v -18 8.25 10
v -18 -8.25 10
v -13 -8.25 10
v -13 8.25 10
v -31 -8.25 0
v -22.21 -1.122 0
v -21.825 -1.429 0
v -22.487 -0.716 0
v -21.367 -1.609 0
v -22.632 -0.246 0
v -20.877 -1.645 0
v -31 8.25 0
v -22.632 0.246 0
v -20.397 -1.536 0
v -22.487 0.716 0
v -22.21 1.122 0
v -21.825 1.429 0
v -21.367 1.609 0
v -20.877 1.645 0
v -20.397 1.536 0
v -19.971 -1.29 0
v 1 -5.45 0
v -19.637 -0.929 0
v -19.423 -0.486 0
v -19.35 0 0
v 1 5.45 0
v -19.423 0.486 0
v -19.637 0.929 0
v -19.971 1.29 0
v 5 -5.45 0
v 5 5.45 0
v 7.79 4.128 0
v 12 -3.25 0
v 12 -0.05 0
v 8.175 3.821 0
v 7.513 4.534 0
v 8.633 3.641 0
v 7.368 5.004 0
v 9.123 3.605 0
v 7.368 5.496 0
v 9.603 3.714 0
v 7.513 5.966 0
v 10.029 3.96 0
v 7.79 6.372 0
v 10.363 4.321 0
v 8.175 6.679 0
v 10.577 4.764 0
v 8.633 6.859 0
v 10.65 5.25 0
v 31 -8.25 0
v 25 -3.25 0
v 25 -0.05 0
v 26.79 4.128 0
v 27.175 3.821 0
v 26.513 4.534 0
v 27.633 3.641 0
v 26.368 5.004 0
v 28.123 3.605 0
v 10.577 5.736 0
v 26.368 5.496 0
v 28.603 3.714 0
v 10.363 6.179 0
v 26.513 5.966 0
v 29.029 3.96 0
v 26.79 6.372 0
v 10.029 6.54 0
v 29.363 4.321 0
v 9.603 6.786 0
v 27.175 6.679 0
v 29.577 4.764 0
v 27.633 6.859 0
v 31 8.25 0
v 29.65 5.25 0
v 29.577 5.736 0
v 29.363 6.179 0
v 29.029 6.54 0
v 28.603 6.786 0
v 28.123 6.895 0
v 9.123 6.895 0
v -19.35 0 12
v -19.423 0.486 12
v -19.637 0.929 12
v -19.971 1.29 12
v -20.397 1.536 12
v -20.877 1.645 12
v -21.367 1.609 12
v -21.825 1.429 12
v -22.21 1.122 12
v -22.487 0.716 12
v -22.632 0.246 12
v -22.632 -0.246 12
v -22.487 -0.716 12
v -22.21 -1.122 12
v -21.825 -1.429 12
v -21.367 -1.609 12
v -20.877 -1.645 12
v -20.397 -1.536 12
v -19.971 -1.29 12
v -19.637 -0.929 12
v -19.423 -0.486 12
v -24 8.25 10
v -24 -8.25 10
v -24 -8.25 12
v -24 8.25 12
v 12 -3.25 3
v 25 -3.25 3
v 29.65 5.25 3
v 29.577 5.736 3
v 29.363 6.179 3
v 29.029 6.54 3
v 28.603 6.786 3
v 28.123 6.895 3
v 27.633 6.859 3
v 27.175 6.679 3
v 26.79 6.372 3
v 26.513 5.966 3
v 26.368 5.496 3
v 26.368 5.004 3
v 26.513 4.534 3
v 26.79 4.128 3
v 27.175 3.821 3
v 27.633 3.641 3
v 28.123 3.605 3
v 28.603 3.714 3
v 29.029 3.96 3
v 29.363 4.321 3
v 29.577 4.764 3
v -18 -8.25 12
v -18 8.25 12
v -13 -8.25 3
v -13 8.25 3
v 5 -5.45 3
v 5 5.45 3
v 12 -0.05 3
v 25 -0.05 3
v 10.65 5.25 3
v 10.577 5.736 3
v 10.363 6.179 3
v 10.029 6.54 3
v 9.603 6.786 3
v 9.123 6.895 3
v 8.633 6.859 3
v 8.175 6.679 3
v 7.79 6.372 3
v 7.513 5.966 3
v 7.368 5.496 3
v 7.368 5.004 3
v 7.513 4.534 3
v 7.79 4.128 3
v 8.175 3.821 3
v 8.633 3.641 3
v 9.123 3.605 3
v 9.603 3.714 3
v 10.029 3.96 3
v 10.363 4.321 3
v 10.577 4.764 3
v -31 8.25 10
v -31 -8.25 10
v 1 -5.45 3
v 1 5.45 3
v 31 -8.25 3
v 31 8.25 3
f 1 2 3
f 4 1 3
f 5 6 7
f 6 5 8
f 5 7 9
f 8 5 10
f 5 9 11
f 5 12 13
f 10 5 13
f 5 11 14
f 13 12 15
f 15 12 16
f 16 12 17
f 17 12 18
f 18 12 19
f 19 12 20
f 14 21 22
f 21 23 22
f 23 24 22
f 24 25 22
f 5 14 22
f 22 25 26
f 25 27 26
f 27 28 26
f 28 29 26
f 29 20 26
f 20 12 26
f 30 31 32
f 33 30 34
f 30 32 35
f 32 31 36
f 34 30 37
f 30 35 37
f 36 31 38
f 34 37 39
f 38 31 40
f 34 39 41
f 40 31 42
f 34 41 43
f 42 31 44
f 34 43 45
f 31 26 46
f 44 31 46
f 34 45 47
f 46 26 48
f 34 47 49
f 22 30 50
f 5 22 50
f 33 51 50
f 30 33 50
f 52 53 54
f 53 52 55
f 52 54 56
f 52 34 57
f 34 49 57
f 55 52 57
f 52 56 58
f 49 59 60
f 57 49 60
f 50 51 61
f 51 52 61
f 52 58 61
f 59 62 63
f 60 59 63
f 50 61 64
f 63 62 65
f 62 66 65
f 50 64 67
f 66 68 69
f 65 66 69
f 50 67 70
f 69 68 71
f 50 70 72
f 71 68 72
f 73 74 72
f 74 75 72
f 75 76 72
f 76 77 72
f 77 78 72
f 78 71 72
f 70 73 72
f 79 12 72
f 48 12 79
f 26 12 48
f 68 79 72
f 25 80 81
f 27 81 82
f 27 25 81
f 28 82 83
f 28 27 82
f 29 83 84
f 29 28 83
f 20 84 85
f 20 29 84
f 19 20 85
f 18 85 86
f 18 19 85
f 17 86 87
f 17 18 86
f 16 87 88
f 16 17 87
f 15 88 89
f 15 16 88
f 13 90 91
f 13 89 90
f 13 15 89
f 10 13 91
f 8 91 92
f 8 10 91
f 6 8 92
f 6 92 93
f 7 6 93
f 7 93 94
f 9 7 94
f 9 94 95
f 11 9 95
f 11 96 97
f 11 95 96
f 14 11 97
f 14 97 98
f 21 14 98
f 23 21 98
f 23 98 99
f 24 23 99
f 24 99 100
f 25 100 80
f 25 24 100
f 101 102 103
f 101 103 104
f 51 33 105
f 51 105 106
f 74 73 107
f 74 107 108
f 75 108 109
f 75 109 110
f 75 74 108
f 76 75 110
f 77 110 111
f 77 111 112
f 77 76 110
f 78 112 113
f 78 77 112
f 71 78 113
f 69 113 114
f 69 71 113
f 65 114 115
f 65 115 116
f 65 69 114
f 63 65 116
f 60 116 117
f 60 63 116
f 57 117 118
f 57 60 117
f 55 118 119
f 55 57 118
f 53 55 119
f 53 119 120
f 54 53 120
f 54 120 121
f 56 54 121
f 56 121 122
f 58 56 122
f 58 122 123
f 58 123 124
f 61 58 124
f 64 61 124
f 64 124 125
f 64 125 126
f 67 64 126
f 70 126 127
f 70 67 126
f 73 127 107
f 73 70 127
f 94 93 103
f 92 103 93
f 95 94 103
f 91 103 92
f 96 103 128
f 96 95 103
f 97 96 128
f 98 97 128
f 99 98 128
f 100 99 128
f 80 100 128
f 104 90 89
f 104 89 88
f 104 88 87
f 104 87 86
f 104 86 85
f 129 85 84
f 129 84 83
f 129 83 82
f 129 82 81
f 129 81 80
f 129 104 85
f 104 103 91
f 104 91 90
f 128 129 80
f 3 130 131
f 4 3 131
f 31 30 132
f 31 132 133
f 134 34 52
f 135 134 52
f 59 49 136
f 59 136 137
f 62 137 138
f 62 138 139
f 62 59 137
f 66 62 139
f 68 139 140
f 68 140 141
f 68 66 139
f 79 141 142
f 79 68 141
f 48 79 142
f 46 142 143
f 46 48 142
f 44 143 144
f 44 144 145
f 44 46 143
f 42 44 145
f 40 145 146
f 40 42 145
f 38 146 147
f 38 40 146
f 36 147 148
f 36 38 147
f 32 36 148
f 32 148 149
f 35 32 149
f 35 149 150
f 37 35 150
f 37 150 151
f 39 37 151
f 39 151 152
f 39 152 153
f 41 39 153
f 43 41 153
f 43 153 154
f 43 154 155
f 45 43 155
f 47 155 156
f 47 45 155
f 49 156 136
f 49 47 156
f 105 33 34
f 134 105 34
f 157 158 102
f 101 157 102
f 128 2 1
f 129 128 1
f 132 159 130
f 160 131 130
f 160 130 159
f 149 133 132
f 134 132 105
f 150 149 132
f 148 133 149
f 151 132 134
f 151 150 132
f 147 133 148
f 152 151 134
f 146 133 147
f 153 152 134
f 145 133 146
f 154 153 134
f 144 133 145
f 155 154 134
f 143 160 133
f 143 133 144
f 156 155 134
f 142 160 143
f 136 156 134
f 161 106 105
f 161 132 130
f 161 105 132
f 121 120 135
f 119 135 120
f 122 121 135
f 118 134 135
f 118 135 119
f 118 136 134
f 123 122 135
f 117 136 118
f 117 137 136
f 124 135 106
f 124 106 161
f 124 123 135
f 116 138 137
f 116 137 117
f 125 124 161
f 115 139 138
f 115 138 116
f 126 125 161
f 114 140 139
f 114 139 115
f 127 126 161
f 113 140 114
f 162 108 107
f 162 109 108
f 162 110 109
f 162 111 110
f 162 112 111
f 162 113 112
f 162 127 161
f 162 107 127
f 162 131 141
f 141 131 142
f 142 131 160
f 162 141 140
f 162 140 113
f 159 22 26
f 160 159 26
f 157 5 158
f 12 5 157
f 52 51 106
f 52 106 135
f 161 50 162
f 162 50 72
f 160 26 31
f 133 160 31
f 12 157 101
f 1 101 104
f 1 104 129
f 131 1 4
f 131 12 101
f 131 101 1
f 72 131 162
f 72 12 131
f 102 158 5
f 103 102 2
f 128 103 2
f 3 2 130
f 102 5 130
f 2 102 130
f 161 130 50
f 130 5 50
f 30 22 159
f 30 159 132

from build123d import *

# Parameters (mm, degrees)
SKETCH050_W     = 62
SKETCH050_H     = 16.5
SKETCH050_R     = 1.65
SKETCH050_W_2   = 13
SKETCH050_H_2   = 3.2
SKETCH050_W_3   = 4
SKETCH050_H_3   = 10.9
PAD010_DEPTH    = 3
SKETCH051_W     = 18
SKETCH051_H     = 16.5
PAD011_DEPTH    = 10
SKETCH052_R     = 1.65
POCKET031_DEPTH = 31.001
SKETCH053_W     = 6
SKETCH053_H     = 16.5
PAD012_DEPTH    = 2
SKETCH054_R     = 1.65
POCKET032_DEPTH = 12.001


with BuildPart() as part:
    # Sketch050 → Pad010 (new body)
    with BuildSketch(Plane.XY):
        Rectangle(SKETCH050_W, SKETCH050_H)
        with Locations((-21, 0)):
            Circle(SKETCH050_R, mode=Mode.SUBTRACT)
        with Locations((28, 5.25)):
            Circle(SKETCH050_R, mode=Mode.SUBTRACT)
        with Locations((9, 5.25)):
            Circle(SKETCH050_R, mode=Mode.SUBTRACT)
        with Locations((18.5, -1.65)):
            Rectangle(SKETCH050_W_2, SKETCH050_H_2, mode=Mode.SUBTRACT)
        with Locations((3, 0)):
            Rectangle(SKETCH050_W_3, SKETCH050_H_3, mode=Mode.SUBTRACT)
    extrude(amount=PAD010_DEPTH)

    # Sketch051 → Pad011 (join)
    with BuildSketch(Plane.XY):
        with Locations((-22, 0)):
            Rectangle(SKETCH051_W, SKETCH051_H)
    extrude(amount=PAD011_DEPTH)

    # Sketch052 → Pocket031 (cut, through all)
    with BuildSketch(Plane.YZ):
        with Locations((0, 13)):
            Circle(SKETCH052_R)
    extrude(amount=-POCKET031_DEPTH, mode=Mode.SUBTRACT)

    # Sketch053 → Pad012 (join)
    with BuildSketch(Plane.XY.offset(10)):
        with Locations((-21, 0)):
            Rectangle(SKETCH053_W, SKETCH053_H)
    extrude(amount=PAD012_DEPTH)

    # Sketch054 → Pocket032 (cut, through all)
    with BuildSketch(Plane.XY):
        with Locations((-21, 0)):
            Circle(SKETCH054_R)
    extrude(amount=POCKET032_DEPTH, mode=Mode.SUBTRACT)


solid = part.part
